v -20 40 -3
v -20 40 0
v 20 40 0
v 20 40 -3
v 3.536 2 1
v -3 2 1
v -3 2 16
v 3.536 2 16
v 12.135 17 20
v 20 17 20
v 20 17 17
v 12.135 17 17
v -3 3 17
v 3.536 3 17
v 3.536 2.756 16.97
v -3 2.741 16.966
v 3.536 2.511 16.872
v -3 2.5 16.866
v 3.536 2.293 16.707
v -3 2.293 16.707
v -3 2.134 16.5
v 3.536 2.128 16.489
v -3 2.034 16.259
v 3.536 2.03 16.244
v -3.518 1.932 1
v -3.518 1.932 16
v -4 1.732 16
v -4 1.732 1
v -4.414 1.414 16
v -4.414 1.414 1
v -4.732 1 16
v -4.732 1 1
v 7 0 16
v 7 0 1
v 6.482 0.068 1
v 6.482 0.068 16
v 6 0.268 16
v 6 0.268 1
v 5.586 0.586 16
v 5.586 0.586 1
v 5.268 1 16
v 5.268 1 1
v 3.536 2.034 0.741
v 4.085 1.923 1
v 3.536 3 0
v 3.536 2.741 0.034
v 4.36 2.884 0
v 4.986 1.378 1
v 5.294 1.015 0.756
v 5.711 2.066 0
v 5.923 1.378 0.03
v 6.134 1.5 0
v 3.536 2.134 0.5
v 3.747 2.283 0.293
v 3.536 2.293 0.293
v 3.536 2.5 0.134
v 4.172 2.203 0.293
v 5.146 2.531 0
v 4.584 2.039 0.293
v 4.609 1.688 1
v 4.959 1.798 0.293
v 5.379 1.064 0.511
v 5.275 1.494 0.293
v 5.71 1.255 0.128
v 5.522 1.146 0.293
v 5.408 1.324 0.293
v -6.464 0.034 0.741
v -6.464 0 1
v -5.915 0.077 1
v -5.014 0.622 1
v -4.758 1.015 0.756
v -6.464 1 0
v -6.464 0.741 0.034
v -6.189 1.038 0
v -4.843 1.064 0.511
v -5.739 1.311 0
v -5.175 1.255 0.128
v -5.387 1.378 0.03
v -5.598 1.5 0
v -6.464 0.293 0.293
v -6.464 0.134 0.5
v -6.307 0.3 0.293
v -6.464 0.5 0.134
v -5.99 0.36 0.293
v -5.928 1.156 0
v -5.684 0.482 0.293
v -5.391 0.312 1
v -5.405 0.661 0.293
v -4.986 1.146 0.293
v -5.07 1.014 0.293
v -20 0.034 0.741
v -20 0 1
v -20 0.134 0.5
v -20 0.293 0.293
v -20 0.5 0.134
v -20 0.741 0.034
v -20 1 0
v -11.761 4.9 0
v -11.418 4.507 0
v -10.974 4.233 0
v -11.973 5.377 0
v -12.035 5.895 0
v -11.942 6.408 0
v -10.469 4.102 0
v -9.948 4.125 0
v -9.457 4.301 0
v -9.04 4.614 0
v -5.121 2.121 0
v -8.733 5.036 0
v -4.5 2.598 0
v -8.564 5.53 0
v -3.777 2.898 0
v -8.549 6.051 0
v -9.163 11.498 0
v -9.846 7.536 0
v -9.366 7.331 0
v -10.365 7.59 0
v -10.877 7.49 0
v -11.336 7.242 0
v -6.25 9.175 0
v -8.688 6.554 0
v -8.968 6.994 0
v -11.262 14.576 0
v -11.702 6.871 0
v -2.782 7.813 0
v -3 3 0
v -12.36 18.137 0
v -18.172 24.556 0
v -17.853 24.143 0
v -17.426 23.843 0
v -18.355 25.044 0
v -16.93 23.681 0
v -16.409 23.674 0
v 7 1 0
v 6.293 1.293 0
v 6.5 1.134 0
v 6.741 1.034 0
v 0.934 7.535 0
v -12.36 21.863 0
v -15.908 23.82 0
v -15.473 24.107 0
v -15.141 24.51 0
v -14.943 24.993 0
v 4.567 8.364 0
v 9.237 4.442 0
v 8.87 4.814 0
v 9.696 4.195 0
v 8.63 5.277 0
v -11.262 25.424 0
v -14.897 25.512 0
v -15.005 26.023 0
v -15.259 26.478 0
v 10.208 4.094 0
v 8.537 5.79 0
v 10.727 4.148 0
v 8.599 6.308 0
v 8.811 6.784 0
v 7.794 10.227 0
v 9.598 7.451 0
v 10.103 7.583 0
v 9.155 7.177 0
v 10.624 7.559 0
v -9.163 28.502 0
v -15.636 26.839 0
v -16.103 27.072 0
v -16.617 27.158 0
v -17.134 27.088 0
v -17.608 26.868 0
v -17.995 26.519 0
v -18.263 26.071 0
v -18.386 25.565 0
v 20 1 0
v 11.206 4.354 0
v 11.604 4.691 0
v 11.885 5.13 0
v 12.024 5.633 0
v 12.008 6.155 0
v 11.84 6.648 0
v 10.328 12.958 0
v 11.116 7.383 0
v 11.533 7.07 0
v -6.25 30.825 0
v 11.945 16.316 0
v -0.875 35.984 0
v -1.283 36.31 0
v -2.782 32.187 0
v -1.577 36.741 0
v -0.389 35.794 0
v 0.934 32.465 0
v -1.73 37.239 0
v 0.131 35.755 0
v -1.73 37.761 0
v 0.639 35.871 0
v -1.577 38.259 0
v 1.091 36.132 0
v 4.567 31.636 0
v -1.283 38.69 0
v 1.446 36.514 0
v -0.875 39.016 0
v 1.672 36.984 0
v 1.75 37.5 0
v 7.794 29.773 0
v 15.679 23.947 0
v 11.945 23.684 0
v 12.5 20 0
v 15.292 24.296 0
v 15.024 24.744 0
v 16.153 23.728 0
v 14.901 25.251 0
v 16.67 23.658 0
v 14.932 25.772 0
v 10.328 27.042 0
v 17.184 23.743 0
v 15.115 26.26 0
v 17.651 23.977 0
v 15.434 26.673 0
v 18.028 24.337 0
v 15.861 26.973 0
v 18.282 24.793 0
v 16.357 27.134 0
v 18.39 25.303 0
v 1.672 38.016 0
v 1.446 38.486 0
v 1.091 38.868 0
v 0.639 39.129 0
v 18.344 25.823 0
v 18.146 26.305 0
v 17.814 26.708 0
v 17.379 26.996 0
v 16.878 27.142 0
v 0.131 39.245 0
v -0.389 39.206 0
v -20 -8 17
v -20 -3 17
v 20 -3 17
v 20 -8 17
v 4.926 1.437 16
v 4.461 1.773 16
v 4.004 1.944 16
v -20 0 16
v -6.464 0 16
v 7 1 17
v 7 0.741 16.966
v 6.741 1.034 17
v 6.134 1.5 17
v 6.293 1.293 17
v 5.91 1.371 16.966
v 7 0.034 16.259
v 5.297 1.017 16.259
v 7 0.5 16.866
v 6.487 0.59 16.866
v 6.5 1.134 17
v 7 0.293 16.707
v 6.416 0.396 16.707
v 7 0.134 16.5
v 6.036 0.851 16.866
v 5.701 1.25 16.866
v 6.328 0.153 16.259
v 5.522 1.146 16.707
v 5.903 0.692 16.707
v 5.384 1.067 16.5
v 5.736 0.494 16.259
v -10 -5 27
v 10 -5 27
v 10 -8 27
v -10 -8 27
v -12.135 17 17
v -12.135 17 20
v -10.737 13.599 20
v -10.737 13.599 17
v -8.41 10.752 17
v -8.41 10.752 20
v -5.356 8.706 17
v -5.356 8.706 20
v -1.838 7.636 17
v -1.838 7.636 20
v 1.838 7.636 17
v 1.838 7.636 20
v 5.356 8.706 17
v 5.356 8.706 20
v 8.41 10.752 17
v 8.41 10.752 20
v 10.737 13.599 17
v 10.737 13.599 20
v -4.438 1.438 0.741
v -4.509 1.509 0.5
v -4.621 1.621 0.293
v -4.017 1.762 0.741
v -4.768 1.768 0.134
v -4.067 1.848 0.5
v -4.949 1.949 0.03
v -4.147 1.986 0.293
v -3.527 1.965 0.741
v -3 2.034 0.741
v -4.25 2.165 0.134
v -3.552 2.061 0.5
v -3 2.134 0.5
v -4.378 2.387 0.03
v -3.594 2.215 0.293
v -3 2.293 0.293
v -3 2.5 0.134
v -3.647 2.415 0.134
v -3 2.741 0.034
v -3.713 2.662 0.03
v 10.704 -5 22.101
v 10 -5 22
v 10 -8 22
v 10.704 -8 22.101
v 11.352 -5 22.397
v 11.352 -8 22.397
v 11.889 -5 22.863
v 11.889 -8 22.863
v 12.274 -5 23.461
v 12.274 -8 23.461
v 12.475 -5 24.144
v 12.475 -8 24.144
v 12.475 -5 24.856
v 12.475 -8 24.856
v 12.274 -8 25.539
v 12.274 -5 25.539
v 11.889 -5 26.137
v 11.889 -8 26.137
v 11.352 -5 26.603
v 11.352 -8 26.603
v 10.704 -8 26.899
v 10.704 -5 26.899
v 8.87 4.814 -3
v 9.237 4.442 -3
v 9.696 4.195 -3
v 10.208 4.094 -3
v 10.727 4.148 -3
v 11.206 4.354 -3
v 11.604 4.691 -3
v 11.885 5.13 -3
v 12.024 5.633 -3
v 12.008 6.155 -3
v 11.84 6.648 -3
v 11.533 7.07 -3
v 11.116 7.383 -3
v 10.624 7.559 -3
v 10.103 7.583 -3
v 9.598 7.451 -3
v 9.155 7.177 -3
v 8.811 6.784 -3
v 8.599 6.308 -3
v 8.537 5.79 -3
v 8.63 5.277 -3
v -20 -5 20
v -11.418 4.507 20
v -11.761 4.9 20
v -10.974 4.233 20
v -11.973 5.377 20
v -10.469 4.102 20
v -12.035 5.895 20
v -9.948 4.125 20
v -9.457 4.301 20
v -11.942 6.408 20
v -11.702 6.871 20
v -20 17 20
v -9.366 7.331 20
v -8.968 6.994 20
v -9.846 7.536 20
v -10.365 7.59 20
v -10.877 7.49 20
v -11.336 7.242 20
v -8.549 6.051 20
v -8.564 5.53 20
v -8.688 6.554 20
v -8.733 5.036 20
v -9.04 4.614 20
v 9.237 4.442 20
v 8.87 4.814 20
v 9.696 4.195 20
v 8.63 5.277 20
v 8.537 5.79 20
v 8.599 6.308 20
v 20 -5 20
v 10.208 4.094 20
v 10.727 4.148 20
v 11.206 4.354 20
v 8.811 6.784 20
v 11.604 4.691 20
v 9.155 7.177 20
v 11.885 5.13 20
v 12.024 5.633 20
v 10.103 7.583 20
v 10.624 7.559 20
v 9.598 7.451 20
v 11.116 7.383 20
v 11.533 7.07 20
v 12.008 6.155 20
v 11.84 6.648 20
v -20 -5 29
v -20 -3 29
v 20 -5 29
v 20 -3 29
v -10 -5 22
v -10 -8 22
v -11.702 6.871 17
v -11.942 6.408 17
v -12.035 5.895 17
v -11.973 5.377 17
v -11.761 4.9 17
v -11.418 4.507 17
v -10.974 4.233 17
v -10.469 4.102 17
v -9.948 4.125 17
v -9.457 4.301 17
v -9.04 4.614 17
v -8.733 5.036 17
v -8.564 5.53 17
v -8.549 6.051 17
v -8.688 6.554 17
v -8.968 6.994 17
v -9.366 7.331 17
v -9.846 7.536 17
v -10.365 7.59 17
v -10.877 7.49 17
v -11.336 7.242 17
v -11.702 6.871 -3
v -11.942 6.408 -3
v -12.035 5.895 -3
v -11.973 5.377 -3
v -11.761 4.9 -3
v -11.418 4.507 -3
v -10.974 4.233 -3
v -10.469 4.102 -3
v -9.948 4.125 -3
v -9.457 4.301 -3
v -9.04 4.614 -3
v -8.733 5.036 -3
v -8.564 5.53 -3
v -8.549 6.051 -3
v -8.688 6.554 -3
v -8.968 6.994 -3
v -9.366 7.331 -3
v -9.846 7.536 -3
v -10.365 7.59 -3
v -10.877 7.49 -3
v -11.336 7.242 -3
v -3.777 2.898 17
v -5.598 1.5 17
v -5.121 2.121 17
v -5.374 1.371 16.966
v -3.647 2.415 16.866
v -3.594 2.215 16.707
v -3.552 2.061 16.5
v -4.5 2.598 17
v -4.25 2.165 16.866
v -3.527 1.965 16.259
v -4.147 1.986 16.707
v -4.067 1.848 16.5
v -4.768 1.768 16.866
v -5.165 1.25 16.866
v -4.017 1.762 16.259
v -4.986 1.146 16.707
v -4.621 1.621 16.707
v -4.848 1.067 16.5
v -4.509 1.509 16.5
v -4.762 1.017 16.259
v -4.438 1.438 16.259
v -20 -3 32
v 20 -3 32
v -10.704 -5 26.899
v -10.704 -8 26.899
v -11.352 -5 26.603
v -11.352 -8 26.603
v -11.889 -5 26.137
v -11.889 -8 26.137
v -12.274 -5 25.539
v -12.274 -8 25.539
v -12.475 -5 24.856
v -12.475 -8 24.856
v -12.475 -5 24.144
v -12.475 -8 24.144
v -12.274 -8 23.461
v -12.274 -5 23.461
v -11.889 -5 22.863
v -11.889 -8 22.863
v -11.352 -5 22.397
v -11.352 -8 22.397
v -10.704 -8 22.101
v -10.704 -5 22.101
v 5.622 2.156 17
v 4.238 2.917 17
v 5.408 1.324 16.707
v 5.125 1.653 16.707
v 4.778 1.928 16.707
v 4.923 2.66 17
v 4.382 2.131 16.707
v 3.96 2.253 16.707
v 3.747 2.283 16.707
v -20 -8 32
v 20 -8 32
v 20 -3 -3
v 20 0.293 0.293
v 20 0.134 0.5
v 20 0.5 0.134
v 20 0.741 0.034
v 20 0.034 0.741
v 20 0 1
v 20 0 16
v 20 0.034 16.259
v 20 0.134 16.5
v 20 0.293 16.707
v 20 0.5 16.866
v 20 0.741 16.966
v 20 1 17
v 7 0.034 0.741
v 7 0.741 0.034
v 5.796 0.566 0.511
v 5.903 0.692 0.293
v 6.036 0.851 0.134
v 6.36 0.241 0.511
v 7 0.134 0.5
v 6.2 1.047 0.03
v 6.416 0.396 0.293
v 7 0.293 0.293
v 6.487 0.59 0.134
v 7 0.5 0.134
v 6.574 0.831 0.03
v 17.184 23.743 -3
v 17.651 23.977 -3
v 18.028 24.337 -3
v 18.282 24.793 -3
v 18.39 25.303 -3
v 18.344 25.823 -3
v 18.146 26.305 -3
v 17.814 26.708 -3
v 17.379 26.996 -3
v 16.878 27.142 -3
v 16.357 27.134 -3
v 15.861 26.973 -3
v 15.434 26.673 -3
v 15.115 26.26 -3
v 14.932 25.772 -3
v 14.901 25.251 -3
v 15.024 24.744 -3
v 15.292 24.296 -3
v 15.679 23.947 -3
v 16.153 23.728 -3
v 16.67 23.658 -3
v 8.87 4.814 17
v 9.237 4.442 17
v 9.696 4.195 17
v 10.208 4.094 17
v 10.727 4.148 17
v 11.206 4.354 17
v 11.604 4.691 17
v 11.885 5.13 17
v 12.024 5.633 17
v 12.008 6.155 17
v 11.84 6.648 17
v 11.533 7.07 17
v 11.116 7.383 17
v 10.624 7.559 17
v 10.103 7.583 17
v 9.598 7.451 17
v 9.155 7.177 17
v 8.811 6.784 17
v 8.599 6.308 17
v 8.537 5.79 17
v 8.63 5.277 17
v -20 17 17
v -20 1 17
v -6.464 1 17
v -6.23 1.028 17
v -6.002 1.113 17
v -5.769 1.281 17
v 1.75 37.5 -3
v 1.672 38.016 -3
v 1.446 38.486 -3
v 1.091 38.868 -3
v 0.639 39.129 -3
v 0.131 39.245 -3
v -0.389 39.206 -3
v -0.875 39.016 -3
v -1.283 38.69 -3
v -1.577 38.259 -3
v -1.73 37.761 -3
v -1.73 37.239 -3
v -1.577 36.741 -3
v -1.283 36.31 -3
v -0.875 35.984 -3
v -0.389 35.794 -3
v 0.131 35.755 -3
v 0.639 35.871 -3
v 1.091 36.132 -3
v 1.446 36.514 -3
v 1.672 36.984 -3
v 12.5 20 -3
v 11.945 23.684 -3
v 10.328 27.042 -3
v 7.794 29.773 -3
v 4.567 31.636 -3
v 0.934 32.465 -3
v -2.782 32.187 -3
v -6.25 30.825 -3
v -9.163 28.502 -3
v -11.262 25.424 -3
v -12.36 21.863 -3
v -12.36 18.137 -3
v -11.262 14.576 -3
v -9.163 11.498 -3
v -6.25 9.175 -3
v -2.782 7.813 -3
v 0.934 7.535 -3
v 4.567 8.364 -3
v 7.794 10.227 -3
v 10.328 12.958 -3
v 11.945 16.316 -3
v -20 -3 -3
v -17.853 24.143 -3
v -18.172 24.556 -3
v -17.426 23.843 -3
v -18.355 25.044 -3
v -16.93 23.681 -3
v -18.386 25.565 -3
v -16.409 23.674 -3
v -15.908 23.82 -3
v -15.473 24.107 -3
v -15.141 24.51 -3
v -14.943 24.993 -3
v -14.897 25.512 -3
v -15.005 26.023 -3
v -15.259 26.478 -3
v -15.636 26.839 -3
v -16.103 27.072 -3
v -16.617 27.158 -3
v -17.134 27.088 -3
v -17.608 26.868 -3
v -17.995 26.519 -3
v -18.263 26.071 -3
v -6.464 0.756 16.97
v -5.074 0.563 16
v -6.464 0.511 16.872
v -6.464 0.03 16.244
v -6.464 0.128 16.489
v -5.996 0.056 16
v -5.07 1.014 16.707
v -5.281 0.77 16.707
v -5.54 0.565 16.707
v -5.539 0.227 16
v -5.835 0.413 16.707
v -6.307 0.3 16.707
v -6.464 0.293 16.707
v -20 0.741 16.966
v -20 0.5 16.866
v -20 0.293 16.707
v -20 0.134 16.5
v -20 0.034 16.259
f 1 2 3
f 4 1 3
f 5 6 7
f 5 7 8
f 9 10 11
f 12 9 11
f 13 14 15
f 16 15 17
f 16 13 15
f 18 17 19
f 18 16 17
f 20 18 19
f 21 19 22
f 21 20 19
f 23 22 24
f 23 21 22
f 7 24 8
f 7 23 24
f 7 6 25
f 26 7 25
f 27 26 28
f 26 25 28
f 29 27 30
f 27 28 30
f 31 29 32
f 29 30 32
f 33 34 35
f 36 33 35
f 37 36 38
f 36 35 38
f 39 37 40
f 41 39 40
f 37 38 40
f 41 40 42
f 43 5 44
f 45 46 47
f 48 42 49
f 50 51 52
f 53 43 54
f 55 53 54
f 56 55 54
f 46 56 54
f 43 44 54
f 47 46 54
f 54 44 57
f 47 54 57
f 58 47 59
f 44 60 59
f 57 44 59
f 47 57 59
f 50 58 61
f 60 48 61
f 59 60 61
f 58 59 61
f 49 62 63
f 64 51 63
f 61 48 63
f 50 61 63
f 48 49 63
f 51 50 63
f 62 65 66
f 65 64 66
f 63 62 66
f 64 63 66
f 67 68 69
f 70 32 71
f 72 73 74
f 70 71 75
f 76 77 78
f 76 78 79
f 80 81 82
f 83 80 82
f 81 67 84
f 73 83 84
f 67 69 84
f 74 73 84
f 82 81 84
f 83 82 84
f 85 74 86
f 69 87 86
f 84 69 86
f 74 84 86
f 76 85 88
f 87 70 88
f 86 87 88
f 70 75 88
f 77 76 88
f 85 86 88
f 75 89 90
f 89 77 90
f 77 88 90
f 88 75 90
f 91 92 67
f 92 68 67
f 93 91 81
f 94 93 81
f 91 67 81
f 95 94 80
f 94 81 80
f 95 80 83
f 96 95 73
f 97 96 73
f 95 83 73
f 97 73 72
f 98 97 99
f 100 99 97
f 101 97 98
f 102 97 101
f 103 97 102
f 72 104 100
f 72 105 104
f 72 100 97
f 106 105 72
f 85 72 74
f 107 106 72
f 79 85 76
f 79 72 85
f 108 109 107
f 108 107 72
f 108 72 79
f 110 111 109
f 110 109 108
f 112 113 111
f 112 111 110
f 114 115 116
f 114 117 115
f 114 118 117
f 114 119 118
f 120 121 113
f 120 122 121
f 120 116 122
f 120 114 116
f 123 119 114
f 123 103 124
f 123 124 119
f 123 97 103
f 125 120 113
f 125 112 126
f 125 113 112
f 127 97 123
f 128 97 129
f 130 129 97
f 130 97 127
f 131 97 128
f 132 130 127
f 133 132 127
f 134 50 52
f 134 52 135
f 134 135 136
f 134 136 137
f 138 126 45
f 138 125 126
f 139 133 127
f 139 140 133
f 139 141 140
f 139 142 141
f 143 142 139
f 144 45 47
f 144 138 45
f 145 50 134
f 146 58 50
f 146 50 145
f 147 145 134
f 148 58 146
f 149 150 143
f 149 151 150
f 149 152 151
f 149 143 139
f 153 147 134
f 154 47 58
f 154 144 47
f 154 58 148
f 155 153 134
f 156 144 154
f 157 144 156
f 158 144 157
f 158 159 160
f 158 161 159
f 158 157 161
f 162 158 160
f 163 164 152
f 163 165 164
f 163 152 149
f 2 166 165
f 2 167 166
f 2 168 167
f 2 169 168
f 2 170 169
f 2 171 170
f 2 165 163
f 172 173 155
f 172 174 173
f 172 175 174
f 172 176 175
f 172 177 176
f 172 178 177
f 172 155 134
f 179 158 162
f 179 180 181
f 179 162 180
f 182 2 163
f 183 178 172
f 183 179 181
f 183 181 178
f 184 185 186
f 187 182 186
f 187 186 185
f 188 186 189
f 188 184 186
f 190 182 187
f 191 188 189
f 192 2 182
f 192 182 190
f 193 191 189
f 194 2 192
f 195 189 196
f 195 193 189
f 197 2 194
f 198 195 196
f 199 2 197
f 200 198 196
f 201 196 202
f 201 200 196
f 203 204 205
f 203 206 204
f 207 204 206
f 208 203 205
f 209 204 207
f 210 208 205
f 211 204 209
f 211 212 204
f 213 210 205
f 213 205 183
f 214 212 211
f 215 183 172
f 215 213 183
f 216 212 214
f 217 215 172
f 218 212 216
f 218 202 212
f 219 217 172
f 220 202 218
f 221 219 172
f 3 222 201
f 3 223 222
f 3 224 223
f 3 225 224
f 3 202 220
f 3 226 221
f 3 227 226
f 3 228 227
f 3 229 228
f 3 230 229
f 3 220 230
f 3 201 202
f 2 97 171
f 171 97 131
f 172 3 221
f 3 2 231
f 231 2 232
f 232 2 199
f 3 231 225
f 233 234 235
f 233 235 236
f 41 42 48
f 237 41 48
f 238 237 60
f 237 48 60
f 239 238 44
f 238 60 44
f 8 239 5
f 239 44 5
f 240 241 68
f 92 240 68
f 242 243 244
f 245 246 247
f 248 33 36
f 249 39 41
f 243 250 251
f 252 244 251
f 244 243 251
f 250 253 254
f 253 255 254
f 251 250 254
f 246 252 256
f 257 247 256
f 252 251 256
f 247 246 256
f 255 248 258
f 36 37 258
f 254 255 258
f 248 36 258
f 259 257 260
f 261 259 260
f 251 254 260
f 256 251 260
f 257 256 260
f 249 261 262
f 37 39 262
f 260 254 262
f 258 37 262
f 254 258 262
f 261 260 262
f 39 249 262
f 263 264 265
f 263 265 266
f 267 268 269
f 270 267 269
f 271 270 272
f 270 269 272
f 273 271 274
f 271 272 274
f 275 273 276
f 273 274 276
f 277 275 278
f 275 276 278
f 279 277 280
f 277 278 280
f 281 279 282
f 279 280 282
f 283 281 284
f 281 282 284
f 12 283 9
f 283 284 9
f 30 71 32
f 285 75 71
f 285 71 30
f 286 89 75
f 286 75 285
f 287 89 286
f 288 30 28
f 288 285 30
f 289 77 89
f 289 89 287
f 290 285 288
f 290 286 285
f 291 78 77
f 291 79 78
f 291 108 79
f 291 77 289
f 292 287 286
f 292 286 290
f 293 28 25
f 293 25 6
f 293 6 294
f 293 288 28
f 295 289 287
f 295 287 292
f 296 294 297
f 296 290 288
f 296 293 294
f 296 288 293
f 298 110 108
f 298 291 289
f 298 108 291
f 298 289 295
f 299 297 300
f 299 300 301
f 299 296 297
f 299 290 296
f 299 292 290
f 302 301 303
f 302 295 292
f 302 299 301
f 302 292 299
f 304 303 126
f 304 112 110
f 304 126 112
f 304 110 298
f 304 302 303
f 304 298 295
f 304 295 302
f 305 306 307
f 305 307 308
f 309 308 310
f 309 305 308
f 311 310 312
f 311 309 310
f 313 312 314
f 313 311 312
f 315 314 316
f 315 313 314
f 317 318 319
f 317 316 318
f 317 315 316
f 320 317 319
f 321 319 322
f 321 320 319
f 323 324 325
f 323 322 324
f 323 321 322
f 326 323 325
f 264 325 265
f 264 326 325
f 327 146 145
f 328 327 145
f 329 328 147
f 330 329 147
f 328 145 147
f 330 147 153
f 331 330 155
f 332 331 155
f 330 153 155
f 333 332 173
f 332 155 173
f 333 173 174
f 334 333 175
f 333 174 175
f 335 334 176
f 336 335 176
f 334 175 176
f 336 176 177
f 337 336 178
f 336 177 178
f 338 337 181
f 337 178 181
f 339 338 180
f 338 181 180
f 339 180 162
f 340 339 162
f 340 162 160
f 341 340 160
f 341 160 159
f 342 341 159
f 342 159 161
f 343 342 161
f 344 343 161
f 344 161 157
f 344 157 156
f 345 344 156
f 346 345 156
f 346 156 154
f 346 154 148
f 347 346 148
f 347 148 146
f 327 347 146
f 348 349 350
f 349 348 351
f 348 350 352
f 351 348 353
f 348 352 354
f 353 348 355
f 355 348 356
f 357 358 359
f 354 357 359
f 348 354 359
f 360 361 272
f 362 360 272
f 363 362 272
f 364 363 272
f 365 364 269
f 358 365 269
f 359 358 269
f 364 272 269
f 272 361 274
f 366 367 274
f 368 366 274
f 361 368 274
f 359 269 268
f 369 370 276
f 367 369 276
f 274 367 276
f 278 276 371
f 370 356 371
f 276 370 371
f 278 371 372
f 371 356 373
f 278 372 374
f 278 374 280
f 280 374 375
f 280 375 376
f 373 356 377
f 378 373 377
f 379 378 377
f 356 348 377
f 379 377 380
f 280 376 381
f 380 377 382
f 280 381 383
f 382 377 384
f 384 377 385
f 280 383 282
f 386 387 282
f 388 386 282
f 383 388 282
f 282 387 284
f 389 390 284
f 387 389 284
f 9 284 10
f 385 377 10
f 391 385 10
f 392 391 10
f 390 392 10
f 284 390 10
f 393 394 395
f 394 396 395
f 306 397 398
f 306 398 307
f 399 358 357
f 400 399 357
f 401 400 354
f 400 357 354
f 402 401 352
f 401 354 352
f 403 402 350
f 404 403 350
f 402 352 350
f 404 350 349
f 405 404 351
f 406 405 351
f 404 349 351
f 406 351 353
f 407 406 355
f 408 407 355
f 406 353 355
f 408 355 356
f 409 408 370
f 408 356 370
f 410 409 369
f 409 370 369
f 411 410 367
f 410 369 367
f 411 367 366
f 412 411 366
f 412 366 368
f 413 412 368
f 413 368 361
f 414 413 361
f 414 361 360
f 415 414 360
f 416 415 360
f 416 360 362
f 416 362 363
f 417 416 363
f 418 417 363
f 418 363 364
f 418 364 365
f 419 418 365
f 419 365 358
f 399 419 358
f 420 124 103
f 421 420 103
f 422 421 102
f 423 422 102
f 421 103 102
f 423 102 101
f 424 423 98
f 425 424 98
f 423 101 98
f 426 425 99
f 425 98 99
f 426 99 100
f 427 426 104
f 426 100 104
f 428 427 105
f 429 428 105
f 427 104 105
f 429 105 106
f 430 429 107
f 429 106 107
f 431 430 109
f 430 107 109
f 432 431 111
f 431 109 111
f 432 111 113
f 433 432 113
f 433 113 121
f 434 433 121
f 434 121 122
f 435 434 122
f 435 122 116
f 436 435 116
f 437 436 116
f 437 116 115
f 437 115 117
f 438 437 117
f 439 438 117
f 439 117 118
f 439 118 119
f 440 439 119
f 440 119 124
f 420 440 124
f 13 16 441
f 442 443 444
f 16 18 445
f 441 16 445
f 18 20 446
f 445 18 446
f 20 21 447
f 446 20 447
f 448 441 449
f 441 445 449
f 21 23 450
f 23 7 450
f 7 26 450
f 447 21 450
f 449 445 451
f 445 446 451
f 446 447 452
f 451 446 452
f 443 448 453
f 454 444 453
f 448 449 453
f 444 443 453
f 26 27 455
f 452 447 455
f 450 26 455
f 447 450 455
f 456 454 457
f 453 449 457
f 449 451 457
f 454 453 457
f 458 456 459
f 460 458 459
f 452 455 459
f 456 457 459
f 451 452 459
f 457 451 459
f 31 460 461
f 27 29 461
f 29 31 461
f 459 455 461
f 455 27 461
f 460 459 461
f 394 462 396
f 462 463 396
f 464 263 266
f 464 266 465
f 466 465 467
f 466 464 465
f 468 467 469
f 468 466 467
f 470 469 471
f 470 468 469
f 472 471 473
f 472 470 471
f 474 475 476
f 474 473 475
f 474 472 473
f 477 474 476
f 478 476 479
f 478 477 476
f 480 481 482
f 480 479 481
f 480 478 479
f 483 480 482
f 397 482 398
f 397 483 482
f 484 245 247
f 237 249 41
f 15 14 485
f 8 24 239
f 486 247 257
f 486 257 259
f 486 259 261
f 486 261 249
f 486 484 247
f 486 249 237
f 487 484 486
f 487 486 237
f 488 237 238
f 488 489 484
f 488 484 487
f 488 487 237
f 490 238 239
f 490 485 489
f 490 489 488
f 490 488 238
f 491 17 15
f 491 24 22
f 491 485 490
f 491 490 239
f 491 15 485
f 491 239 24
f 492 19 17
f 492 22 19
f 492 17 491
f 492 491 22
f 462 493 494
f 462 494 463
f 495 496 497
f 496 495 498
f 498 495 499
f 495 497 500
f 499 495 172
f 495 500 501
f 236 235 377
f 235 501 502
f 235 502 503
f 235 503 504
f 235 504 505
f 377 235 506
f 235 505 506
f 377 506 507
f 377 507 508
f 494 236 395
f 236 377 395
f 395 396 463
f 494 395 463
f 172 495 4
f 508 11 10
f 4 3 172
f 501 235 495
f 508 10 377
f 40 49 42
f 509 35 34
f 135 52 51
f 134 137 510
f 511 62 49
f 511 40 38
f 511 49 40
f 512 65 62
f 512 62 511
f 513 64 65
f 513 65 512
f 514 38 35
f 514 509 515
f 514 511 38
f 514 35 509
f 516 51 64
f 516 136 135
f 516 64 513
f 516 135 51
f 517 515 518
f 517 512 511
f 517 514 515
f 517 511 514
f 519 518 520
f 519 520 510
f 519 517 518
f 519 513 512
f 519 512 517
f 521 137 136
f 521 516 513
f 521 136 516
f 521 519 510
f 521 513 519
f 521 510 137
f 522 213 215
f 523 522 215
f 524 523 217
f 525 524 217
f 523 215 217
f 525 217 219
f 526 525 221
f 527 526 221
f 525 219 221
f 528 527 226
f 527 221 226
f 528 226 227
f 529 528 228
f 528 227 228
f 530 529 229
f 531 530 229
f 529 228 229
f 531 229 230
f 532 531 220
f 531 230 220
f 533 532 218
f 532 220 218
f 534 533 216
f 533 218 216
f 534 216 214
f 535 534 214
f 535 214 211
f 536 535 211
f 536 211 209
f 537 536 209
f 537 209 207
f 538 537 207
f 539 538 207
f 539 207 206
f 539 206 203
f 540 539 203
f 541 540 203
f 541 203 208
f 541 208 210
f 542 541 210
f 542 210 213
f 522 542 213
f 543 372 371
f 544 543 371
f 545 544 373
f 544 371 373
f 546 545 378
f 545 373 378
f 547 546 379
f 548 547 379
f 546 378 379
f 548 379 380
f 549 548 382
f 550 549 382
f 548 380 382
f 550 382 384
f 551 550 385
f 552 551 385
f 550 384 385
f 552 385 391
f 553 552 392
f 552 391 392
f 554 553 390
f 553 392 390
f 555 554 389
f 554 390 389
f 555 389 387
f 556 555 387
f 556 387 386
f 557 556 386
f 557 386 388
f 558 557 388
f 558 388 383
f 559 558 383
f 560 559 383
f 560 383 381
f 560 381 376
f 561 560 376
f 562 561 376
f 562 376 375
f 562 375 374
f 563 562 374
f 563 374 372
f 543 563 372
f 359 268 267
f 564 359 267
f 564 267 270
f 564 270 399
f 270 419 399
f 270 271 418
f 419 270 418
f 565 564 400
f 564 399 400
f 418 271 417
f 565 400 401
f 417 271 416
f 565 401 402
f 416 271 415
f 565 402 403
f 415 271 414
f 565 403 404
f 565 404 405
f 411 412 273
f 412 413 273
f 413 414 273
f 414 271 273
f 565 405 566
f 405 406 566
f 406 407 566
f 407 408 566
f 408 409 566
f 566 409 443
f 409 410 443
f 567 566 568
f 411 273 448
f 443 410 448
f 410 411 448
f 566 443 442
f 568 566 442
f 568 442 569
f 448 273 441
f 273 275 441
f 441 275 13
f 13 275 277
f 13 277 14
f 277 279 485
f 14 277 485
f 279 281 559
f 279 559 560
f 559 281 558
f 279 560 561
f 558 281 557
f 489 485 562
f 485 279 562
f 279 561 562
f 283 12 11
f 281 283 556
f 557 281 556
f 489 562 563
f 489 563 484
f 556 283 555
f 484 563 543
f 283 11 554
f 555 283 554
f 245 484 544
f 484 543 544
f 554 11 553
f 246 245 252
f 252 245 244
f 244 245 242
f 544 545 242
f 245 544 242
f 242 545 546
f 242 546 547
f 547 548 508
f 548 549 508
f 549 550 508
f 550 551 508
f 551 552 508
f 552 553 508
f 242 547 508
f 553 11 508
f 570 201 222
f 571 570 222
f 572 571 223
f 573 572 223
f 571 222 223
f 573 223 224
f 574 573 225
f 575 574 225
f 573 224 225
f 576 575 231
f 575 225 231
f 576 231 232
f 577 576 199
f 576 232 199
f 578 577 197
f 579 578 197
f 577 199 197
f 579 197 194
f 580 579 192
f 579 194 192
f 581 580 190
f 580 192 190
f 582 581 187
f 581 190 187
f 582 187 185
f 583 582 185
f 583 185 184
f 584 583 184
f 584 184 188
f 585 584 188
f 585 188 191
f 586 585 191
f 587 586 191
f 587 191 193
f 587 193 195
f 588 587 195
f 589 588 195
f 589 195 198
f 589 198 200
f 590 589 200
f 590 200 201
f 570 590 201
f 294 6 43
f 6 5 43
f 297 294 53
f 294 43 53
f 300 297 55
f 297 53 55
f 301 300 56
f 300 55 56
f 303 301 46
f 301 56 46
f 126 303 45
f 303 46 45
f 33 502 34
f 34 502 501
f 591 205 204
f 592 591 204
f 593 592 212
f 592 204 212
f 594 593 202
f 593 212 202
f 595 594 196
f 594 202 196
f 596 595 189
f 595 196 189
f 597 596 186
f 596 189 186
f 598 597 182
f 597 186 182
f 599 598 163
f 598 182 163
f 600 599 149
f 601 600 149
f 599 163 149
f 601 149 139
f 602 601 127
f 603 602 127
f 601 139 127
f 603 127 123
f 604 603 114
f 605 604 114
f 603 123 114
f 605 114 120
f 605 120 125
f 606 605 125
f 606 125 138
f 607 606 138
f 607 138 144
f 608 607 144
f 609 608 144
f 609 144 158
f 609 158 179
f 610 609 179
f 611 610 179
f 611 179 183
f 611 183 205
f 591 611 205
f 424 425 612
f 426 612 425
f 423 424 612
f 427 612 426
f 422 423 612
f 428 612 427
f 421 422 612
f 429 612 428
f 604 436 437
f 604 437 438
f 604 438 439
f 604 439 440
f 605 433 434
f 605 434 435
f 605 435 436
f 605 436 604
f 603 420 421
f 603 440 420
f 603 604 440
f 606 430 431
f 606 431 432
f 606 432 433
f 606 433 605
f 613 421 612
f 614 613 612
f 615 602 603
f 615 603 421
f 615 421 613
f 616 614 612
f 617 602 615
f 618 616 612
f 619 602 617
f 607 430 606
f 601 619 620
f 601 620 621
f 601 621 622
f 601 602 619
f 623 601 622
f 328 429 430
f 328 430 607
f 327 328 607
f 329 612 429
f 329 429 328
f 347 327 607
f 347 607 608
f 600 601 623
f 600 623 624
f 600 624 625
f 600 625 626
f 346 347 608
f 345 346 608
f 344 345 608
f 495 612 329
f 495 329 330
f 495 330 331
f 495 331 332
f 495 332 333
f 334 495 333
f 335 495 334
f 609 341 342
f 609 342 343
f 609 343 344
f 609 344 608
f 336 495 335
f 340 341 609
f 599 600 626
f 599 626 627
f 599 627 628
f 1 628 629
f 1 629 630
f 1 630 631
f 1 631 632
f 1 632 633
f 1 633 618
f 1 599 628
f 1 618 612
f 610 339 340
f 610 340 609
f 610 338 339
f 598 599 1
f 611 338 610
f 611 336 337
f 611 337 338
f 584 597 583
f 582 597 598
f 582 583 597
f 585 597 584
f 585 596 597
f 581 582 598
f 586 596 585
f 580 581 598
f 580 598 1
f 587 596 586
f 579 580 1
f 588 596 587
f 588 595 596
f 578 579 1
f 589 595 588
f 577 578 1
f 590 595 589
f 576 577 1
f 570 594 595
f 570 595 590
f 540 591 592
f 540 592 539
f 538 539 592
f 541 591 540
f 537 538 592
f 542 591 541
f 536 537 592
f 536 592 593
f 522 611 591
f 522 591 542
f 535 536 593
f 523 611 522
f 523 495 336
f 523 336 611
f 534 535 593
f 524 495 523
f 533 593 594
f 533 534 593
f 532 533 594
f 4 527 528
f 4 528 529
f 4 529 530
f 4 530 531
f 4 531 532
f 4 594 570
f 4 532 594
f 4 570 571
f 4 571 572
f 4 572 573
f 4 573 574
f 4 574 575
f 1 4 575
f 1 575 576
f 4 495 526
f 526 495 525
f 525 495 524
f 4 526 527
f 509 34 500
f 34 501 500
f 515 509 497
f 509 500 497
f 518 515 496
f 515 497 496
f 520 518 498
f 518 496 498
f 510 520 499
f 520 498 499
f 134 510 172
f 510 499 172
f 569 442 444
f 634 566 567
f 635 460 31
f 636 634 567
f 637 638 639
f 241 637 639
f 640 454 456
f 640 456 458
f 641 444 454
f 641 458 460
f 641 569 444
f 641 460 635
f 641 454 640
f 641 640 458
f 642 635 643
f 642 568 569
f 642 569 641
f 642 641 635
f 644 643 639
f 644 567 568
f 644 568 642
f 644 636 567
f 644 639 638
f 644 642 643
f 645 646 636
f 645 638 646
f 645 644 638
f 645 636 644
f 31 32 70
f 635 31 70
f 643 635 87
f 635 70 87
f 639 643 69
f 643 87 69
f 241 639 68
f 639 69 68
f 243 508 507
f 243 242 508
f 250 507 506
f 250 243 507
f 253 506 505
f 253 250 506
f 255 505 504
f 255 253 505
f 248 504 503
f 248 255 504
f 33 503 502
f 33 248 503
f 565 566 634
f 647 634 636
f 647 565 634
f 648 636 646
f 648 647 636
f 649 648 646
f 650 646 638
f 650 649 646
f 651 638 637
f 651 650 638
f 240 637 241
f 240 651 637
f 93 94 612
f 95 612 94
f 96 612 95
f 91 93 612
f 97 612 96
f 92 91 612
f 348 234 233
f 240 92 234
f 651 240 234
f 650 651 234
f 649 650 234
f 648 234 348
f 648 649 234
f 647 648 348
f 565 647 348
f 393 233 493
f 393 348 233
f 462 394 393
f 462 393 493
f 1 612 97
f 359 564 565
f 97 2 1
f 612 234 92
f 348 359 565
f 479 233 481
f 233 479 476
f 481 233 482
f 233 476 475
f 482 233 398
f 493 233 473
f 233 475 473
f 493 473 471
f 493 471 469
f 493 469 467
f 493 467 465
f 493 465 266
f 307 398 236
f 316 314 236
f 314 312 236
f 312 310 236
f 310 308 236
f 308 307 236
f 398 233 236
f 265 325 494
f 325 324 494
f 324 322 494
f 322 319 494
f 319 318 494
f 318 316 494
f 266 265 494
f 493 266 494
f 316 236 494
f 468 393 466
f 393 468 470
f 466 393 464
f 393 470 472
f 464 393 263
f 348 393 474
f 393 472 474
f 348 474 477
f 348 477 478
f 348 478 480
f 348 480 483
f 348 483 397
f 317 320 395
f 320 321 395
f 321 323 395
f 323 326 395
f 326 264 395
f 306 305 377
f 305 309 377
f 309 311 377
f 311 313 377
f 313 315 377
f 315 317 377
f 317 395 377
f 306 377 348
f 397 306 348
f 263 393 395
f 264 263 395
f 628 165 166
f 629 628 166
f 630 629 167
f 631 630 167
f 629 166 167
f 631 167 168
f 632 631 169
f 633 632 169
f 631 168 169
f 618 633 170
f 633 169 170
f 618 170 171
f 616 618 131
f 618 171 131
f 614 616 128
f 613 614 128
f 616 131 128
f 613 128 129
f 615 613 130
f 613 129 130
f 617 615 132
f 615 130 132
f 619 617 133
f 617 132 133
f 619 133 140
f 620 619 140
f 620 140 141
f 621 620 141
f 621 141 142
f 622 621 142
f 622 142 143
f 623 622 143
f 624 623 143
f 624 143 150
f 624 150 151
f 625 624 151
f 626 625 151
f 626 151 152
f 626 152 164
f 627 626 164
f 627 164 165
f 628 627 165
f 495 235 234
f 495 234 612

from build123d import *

# Parameters (mm, degrees)
SKETCH1_W           = 40
SKETCH1_H           = 40
BOSS_EXTRUDE1_DEPTH = 3
SKETCH3_W           = 20
SKETCH3_H           = 3
EXTRUDE_THIN1_DEPTH = 20
SKETCH4_W           = 10
SKETCH4_H           = 17
BOSS_EXTRUDE2_DEPTH = 2
EXTRUDE_THIN2_DEPTH = 20
SKETCH6_R           = 12.5
CUT_EXTRUDE1_DEPTH  = 57.789083458
SKETCH7_R           = 1.75
CUT_EXTRUDE2_DEPTH  = 55.990908339
CIRPATTERN1_COUNT   = 5
SKETCH8_R           = 1.75
CUT_EXTRUDE3_DEPTH  = 10
SKETCH9_R           = 1.75
CUT_EXTRUDE4_DEPTH  = 10
CUT_EXTRUDE5_DEPTH  = 59.72818744
FILLET1_R           = 2
FILLET3_R           = 2
FILLET4_R           = 2
FILLET5_R           = 2
FILLET2_R           = 1


with BuildPart() as part:
    # Sketch1 → Boss-Extrude1 (new body)
    with BuildSketch(Plane.XY):
        with Locations((0, 20)):
            Rectangle(SKETCH1_W, SKETCH1_H)
    extrude(amount=-BOSS_EXTRUDE1_DEPTH)

    # Sketch3 → Extrude-Thin1 (add, symmetric)
    with BuildSketch(Plane(origin=(0, 0, 0), x_dir=(0, 0, -1), z_dir=(1, 0, 0))):
        with Locations((-7, -1.5)):
            Rectangle(SKETCH3_W, SKETCH3_H)
    extrude(amount=EXTRUDE_THIN1_DEPTH, both=True)

    # Sketch4 → Boss-Extrude2 (add)
    with BuildSketch(Plane(origin=(0, 0, 0), x_dir=(1, 0, 0), z_dir=(0, 1, 0))):
        with Locations((0, -8.5)):
            Rectangle(SKETCH4_W, SKETCH4_H)
    extrude(amount=BOSS_EXTRUDE2_DEPTH)

    # Sketch5 → Extrude-Thin2 (add, symmetric)
    with BuildSketch(Plane(origin=(0, 0, 0), x_dir=(0, 0, -1), z_dir=(1, 0, 0))):
        Polygon((-17, 17), (-17, -8), (-32, -8), (-32, -3), (-29, -3), (-29, -5), (-20, -5), (-20, 17), align=None)
    extrude(amount=EXTRUDE_THIN2_DEPTH, both=True)

    # Sketch6 → Cut-Extrude1 (cut, through all)
    with BuildSketch(Plane.XY.offset(32)):
        with Locations((0, 20)):
            Circle(SKETCH6_R)
    extrude(amount=-CUT_EXTRUDE1_DEPTH, mode=Mode.SUBTRACT)

    # Sketch7 → Cut-Extrude2 (cut, through all)
    with BuildSketch(Plane.XY):
        with Locations((0, 37.5)):
            Circle(SKETCH7_R)
    cut_extrude2 = extrude(amount=-CUT_EXTRUDE2_DEPTH, mode=Mode.SUBTRACT)

    # CirPattern1: Cut-Extrude2 ×5 about axis
    cirpattern1_axis = Axis((0, 20, 0), (0, 0, 1))
    for i in range(1, CIRPATTERN1_COUNT):
        add(cut_extrude2.rotate(cirpattern1_axis, i * 360 / CIRPATTERN1_COUNT), mode=Mode.SUBTRACT)

    # Sketch8 → Cut-Extrude3 (cut)
    with BuildSketch(Plane.XY.offset(20)):
        with Locations(Location((10.286241915, 5.842202598, 0), (0, 0, 216))):
            Circle(SKETCH8_R)
    extrude(amount=-CUT_EXTRUDE3_DEPTH, mode=Mode.SUBTRACT)

    # Sketch9 → Cut-Extrude4 (cut)
    with BuildSketch(Plane.XY.offset(20)):
        with Locations(Location((-10.286241915, 5.842202598, 0), (0, 0, 144))):
            Circle(SKETCH9_R)
    extrude(amount=-CUT_EXTRUDE4_DEPTH, mode=Mode.SUBTRACT)

    # Sketch10 → Cut-Extrude5 (cut, through all)
    with BuildSketch(Plane(origin=(0, -5, 0), x_dir=(1, 0, 0), z_dir=(0, 1, 0))):
        with BuildLine():
            Line((-10, -22), (10, -22))
            ThreePointArc((10, -22), (12.5, -24.5), (10, -27))
            Line((10, -27), (-10, -27))
            ThreePointArc((-10, -27), (-12.5, -24.5), (-10, -22))
        make_face()
    extrude(amount=-CUT_EXTRUDE5_DEPTH, mode=Mode.SUBTRACT)

    # Fillet1
    fillet1_edges = [part.edges().sort_by_distance(p)[0] for p in [
        (5, 0, 8.5),
    ]]
    fillet(fillet1_edges, radius=FILLET1_R - 0.0001)  # a hair under: the kernel refuses the full size

    # Fillet3
    fillet3_edges = [part.edges().sort_by_distance(p)[0] for p in [
        (5, 2, 8.5),
    ]]
    fillet(fillet3_edges, radius=FILLET3_R)

    # Fillet4
    fillet4_edges = [part.edges().sort_by_distance(p)[0] for p in [
        (-5, 2, 8.5),
    ]]
    fillet(fillet4_edges, radius=FILLET4_R - 0.0001)  # a hair under: the kernel refuses the full size

    # Fillet5
    fillet5_edges = [part.edges().sort_by_distance(p)[0] for p in [
        (-5, 0, 8.5),
    ]]
    fillet(fillet5_edges, radius=FILLET5_R)

    # Fillet2
    fillet2_edges = [part.edges().sort_by_distance(p)[0] for p in [
        (13.49995, 0, 0),
        (5.9999375, 0.267943012, 17),
        (0.26787806, 2, 0),
        (5.9999375, 0.267943012, 0),
        (4.535868621, 1.73204359, 0),
        (4.535868621, 1.73204359, 17),
        (0.26787806, 2, 17),
        (-4.0000625, 1.732056988, 17),
        (-4.0000625, 1.732056988, 0),
        (-13.23207194, 0, 17),
        (-5.464131379, 0.26795641, 17),
        (-5.464131379, 0.26795641, 0),
        (13.49995, 0, 17),
        (-13.23207194, 0, 0),
    ]]
    fillet(fillet2_edges, radius=FILLET2_R)


solid = part.part
